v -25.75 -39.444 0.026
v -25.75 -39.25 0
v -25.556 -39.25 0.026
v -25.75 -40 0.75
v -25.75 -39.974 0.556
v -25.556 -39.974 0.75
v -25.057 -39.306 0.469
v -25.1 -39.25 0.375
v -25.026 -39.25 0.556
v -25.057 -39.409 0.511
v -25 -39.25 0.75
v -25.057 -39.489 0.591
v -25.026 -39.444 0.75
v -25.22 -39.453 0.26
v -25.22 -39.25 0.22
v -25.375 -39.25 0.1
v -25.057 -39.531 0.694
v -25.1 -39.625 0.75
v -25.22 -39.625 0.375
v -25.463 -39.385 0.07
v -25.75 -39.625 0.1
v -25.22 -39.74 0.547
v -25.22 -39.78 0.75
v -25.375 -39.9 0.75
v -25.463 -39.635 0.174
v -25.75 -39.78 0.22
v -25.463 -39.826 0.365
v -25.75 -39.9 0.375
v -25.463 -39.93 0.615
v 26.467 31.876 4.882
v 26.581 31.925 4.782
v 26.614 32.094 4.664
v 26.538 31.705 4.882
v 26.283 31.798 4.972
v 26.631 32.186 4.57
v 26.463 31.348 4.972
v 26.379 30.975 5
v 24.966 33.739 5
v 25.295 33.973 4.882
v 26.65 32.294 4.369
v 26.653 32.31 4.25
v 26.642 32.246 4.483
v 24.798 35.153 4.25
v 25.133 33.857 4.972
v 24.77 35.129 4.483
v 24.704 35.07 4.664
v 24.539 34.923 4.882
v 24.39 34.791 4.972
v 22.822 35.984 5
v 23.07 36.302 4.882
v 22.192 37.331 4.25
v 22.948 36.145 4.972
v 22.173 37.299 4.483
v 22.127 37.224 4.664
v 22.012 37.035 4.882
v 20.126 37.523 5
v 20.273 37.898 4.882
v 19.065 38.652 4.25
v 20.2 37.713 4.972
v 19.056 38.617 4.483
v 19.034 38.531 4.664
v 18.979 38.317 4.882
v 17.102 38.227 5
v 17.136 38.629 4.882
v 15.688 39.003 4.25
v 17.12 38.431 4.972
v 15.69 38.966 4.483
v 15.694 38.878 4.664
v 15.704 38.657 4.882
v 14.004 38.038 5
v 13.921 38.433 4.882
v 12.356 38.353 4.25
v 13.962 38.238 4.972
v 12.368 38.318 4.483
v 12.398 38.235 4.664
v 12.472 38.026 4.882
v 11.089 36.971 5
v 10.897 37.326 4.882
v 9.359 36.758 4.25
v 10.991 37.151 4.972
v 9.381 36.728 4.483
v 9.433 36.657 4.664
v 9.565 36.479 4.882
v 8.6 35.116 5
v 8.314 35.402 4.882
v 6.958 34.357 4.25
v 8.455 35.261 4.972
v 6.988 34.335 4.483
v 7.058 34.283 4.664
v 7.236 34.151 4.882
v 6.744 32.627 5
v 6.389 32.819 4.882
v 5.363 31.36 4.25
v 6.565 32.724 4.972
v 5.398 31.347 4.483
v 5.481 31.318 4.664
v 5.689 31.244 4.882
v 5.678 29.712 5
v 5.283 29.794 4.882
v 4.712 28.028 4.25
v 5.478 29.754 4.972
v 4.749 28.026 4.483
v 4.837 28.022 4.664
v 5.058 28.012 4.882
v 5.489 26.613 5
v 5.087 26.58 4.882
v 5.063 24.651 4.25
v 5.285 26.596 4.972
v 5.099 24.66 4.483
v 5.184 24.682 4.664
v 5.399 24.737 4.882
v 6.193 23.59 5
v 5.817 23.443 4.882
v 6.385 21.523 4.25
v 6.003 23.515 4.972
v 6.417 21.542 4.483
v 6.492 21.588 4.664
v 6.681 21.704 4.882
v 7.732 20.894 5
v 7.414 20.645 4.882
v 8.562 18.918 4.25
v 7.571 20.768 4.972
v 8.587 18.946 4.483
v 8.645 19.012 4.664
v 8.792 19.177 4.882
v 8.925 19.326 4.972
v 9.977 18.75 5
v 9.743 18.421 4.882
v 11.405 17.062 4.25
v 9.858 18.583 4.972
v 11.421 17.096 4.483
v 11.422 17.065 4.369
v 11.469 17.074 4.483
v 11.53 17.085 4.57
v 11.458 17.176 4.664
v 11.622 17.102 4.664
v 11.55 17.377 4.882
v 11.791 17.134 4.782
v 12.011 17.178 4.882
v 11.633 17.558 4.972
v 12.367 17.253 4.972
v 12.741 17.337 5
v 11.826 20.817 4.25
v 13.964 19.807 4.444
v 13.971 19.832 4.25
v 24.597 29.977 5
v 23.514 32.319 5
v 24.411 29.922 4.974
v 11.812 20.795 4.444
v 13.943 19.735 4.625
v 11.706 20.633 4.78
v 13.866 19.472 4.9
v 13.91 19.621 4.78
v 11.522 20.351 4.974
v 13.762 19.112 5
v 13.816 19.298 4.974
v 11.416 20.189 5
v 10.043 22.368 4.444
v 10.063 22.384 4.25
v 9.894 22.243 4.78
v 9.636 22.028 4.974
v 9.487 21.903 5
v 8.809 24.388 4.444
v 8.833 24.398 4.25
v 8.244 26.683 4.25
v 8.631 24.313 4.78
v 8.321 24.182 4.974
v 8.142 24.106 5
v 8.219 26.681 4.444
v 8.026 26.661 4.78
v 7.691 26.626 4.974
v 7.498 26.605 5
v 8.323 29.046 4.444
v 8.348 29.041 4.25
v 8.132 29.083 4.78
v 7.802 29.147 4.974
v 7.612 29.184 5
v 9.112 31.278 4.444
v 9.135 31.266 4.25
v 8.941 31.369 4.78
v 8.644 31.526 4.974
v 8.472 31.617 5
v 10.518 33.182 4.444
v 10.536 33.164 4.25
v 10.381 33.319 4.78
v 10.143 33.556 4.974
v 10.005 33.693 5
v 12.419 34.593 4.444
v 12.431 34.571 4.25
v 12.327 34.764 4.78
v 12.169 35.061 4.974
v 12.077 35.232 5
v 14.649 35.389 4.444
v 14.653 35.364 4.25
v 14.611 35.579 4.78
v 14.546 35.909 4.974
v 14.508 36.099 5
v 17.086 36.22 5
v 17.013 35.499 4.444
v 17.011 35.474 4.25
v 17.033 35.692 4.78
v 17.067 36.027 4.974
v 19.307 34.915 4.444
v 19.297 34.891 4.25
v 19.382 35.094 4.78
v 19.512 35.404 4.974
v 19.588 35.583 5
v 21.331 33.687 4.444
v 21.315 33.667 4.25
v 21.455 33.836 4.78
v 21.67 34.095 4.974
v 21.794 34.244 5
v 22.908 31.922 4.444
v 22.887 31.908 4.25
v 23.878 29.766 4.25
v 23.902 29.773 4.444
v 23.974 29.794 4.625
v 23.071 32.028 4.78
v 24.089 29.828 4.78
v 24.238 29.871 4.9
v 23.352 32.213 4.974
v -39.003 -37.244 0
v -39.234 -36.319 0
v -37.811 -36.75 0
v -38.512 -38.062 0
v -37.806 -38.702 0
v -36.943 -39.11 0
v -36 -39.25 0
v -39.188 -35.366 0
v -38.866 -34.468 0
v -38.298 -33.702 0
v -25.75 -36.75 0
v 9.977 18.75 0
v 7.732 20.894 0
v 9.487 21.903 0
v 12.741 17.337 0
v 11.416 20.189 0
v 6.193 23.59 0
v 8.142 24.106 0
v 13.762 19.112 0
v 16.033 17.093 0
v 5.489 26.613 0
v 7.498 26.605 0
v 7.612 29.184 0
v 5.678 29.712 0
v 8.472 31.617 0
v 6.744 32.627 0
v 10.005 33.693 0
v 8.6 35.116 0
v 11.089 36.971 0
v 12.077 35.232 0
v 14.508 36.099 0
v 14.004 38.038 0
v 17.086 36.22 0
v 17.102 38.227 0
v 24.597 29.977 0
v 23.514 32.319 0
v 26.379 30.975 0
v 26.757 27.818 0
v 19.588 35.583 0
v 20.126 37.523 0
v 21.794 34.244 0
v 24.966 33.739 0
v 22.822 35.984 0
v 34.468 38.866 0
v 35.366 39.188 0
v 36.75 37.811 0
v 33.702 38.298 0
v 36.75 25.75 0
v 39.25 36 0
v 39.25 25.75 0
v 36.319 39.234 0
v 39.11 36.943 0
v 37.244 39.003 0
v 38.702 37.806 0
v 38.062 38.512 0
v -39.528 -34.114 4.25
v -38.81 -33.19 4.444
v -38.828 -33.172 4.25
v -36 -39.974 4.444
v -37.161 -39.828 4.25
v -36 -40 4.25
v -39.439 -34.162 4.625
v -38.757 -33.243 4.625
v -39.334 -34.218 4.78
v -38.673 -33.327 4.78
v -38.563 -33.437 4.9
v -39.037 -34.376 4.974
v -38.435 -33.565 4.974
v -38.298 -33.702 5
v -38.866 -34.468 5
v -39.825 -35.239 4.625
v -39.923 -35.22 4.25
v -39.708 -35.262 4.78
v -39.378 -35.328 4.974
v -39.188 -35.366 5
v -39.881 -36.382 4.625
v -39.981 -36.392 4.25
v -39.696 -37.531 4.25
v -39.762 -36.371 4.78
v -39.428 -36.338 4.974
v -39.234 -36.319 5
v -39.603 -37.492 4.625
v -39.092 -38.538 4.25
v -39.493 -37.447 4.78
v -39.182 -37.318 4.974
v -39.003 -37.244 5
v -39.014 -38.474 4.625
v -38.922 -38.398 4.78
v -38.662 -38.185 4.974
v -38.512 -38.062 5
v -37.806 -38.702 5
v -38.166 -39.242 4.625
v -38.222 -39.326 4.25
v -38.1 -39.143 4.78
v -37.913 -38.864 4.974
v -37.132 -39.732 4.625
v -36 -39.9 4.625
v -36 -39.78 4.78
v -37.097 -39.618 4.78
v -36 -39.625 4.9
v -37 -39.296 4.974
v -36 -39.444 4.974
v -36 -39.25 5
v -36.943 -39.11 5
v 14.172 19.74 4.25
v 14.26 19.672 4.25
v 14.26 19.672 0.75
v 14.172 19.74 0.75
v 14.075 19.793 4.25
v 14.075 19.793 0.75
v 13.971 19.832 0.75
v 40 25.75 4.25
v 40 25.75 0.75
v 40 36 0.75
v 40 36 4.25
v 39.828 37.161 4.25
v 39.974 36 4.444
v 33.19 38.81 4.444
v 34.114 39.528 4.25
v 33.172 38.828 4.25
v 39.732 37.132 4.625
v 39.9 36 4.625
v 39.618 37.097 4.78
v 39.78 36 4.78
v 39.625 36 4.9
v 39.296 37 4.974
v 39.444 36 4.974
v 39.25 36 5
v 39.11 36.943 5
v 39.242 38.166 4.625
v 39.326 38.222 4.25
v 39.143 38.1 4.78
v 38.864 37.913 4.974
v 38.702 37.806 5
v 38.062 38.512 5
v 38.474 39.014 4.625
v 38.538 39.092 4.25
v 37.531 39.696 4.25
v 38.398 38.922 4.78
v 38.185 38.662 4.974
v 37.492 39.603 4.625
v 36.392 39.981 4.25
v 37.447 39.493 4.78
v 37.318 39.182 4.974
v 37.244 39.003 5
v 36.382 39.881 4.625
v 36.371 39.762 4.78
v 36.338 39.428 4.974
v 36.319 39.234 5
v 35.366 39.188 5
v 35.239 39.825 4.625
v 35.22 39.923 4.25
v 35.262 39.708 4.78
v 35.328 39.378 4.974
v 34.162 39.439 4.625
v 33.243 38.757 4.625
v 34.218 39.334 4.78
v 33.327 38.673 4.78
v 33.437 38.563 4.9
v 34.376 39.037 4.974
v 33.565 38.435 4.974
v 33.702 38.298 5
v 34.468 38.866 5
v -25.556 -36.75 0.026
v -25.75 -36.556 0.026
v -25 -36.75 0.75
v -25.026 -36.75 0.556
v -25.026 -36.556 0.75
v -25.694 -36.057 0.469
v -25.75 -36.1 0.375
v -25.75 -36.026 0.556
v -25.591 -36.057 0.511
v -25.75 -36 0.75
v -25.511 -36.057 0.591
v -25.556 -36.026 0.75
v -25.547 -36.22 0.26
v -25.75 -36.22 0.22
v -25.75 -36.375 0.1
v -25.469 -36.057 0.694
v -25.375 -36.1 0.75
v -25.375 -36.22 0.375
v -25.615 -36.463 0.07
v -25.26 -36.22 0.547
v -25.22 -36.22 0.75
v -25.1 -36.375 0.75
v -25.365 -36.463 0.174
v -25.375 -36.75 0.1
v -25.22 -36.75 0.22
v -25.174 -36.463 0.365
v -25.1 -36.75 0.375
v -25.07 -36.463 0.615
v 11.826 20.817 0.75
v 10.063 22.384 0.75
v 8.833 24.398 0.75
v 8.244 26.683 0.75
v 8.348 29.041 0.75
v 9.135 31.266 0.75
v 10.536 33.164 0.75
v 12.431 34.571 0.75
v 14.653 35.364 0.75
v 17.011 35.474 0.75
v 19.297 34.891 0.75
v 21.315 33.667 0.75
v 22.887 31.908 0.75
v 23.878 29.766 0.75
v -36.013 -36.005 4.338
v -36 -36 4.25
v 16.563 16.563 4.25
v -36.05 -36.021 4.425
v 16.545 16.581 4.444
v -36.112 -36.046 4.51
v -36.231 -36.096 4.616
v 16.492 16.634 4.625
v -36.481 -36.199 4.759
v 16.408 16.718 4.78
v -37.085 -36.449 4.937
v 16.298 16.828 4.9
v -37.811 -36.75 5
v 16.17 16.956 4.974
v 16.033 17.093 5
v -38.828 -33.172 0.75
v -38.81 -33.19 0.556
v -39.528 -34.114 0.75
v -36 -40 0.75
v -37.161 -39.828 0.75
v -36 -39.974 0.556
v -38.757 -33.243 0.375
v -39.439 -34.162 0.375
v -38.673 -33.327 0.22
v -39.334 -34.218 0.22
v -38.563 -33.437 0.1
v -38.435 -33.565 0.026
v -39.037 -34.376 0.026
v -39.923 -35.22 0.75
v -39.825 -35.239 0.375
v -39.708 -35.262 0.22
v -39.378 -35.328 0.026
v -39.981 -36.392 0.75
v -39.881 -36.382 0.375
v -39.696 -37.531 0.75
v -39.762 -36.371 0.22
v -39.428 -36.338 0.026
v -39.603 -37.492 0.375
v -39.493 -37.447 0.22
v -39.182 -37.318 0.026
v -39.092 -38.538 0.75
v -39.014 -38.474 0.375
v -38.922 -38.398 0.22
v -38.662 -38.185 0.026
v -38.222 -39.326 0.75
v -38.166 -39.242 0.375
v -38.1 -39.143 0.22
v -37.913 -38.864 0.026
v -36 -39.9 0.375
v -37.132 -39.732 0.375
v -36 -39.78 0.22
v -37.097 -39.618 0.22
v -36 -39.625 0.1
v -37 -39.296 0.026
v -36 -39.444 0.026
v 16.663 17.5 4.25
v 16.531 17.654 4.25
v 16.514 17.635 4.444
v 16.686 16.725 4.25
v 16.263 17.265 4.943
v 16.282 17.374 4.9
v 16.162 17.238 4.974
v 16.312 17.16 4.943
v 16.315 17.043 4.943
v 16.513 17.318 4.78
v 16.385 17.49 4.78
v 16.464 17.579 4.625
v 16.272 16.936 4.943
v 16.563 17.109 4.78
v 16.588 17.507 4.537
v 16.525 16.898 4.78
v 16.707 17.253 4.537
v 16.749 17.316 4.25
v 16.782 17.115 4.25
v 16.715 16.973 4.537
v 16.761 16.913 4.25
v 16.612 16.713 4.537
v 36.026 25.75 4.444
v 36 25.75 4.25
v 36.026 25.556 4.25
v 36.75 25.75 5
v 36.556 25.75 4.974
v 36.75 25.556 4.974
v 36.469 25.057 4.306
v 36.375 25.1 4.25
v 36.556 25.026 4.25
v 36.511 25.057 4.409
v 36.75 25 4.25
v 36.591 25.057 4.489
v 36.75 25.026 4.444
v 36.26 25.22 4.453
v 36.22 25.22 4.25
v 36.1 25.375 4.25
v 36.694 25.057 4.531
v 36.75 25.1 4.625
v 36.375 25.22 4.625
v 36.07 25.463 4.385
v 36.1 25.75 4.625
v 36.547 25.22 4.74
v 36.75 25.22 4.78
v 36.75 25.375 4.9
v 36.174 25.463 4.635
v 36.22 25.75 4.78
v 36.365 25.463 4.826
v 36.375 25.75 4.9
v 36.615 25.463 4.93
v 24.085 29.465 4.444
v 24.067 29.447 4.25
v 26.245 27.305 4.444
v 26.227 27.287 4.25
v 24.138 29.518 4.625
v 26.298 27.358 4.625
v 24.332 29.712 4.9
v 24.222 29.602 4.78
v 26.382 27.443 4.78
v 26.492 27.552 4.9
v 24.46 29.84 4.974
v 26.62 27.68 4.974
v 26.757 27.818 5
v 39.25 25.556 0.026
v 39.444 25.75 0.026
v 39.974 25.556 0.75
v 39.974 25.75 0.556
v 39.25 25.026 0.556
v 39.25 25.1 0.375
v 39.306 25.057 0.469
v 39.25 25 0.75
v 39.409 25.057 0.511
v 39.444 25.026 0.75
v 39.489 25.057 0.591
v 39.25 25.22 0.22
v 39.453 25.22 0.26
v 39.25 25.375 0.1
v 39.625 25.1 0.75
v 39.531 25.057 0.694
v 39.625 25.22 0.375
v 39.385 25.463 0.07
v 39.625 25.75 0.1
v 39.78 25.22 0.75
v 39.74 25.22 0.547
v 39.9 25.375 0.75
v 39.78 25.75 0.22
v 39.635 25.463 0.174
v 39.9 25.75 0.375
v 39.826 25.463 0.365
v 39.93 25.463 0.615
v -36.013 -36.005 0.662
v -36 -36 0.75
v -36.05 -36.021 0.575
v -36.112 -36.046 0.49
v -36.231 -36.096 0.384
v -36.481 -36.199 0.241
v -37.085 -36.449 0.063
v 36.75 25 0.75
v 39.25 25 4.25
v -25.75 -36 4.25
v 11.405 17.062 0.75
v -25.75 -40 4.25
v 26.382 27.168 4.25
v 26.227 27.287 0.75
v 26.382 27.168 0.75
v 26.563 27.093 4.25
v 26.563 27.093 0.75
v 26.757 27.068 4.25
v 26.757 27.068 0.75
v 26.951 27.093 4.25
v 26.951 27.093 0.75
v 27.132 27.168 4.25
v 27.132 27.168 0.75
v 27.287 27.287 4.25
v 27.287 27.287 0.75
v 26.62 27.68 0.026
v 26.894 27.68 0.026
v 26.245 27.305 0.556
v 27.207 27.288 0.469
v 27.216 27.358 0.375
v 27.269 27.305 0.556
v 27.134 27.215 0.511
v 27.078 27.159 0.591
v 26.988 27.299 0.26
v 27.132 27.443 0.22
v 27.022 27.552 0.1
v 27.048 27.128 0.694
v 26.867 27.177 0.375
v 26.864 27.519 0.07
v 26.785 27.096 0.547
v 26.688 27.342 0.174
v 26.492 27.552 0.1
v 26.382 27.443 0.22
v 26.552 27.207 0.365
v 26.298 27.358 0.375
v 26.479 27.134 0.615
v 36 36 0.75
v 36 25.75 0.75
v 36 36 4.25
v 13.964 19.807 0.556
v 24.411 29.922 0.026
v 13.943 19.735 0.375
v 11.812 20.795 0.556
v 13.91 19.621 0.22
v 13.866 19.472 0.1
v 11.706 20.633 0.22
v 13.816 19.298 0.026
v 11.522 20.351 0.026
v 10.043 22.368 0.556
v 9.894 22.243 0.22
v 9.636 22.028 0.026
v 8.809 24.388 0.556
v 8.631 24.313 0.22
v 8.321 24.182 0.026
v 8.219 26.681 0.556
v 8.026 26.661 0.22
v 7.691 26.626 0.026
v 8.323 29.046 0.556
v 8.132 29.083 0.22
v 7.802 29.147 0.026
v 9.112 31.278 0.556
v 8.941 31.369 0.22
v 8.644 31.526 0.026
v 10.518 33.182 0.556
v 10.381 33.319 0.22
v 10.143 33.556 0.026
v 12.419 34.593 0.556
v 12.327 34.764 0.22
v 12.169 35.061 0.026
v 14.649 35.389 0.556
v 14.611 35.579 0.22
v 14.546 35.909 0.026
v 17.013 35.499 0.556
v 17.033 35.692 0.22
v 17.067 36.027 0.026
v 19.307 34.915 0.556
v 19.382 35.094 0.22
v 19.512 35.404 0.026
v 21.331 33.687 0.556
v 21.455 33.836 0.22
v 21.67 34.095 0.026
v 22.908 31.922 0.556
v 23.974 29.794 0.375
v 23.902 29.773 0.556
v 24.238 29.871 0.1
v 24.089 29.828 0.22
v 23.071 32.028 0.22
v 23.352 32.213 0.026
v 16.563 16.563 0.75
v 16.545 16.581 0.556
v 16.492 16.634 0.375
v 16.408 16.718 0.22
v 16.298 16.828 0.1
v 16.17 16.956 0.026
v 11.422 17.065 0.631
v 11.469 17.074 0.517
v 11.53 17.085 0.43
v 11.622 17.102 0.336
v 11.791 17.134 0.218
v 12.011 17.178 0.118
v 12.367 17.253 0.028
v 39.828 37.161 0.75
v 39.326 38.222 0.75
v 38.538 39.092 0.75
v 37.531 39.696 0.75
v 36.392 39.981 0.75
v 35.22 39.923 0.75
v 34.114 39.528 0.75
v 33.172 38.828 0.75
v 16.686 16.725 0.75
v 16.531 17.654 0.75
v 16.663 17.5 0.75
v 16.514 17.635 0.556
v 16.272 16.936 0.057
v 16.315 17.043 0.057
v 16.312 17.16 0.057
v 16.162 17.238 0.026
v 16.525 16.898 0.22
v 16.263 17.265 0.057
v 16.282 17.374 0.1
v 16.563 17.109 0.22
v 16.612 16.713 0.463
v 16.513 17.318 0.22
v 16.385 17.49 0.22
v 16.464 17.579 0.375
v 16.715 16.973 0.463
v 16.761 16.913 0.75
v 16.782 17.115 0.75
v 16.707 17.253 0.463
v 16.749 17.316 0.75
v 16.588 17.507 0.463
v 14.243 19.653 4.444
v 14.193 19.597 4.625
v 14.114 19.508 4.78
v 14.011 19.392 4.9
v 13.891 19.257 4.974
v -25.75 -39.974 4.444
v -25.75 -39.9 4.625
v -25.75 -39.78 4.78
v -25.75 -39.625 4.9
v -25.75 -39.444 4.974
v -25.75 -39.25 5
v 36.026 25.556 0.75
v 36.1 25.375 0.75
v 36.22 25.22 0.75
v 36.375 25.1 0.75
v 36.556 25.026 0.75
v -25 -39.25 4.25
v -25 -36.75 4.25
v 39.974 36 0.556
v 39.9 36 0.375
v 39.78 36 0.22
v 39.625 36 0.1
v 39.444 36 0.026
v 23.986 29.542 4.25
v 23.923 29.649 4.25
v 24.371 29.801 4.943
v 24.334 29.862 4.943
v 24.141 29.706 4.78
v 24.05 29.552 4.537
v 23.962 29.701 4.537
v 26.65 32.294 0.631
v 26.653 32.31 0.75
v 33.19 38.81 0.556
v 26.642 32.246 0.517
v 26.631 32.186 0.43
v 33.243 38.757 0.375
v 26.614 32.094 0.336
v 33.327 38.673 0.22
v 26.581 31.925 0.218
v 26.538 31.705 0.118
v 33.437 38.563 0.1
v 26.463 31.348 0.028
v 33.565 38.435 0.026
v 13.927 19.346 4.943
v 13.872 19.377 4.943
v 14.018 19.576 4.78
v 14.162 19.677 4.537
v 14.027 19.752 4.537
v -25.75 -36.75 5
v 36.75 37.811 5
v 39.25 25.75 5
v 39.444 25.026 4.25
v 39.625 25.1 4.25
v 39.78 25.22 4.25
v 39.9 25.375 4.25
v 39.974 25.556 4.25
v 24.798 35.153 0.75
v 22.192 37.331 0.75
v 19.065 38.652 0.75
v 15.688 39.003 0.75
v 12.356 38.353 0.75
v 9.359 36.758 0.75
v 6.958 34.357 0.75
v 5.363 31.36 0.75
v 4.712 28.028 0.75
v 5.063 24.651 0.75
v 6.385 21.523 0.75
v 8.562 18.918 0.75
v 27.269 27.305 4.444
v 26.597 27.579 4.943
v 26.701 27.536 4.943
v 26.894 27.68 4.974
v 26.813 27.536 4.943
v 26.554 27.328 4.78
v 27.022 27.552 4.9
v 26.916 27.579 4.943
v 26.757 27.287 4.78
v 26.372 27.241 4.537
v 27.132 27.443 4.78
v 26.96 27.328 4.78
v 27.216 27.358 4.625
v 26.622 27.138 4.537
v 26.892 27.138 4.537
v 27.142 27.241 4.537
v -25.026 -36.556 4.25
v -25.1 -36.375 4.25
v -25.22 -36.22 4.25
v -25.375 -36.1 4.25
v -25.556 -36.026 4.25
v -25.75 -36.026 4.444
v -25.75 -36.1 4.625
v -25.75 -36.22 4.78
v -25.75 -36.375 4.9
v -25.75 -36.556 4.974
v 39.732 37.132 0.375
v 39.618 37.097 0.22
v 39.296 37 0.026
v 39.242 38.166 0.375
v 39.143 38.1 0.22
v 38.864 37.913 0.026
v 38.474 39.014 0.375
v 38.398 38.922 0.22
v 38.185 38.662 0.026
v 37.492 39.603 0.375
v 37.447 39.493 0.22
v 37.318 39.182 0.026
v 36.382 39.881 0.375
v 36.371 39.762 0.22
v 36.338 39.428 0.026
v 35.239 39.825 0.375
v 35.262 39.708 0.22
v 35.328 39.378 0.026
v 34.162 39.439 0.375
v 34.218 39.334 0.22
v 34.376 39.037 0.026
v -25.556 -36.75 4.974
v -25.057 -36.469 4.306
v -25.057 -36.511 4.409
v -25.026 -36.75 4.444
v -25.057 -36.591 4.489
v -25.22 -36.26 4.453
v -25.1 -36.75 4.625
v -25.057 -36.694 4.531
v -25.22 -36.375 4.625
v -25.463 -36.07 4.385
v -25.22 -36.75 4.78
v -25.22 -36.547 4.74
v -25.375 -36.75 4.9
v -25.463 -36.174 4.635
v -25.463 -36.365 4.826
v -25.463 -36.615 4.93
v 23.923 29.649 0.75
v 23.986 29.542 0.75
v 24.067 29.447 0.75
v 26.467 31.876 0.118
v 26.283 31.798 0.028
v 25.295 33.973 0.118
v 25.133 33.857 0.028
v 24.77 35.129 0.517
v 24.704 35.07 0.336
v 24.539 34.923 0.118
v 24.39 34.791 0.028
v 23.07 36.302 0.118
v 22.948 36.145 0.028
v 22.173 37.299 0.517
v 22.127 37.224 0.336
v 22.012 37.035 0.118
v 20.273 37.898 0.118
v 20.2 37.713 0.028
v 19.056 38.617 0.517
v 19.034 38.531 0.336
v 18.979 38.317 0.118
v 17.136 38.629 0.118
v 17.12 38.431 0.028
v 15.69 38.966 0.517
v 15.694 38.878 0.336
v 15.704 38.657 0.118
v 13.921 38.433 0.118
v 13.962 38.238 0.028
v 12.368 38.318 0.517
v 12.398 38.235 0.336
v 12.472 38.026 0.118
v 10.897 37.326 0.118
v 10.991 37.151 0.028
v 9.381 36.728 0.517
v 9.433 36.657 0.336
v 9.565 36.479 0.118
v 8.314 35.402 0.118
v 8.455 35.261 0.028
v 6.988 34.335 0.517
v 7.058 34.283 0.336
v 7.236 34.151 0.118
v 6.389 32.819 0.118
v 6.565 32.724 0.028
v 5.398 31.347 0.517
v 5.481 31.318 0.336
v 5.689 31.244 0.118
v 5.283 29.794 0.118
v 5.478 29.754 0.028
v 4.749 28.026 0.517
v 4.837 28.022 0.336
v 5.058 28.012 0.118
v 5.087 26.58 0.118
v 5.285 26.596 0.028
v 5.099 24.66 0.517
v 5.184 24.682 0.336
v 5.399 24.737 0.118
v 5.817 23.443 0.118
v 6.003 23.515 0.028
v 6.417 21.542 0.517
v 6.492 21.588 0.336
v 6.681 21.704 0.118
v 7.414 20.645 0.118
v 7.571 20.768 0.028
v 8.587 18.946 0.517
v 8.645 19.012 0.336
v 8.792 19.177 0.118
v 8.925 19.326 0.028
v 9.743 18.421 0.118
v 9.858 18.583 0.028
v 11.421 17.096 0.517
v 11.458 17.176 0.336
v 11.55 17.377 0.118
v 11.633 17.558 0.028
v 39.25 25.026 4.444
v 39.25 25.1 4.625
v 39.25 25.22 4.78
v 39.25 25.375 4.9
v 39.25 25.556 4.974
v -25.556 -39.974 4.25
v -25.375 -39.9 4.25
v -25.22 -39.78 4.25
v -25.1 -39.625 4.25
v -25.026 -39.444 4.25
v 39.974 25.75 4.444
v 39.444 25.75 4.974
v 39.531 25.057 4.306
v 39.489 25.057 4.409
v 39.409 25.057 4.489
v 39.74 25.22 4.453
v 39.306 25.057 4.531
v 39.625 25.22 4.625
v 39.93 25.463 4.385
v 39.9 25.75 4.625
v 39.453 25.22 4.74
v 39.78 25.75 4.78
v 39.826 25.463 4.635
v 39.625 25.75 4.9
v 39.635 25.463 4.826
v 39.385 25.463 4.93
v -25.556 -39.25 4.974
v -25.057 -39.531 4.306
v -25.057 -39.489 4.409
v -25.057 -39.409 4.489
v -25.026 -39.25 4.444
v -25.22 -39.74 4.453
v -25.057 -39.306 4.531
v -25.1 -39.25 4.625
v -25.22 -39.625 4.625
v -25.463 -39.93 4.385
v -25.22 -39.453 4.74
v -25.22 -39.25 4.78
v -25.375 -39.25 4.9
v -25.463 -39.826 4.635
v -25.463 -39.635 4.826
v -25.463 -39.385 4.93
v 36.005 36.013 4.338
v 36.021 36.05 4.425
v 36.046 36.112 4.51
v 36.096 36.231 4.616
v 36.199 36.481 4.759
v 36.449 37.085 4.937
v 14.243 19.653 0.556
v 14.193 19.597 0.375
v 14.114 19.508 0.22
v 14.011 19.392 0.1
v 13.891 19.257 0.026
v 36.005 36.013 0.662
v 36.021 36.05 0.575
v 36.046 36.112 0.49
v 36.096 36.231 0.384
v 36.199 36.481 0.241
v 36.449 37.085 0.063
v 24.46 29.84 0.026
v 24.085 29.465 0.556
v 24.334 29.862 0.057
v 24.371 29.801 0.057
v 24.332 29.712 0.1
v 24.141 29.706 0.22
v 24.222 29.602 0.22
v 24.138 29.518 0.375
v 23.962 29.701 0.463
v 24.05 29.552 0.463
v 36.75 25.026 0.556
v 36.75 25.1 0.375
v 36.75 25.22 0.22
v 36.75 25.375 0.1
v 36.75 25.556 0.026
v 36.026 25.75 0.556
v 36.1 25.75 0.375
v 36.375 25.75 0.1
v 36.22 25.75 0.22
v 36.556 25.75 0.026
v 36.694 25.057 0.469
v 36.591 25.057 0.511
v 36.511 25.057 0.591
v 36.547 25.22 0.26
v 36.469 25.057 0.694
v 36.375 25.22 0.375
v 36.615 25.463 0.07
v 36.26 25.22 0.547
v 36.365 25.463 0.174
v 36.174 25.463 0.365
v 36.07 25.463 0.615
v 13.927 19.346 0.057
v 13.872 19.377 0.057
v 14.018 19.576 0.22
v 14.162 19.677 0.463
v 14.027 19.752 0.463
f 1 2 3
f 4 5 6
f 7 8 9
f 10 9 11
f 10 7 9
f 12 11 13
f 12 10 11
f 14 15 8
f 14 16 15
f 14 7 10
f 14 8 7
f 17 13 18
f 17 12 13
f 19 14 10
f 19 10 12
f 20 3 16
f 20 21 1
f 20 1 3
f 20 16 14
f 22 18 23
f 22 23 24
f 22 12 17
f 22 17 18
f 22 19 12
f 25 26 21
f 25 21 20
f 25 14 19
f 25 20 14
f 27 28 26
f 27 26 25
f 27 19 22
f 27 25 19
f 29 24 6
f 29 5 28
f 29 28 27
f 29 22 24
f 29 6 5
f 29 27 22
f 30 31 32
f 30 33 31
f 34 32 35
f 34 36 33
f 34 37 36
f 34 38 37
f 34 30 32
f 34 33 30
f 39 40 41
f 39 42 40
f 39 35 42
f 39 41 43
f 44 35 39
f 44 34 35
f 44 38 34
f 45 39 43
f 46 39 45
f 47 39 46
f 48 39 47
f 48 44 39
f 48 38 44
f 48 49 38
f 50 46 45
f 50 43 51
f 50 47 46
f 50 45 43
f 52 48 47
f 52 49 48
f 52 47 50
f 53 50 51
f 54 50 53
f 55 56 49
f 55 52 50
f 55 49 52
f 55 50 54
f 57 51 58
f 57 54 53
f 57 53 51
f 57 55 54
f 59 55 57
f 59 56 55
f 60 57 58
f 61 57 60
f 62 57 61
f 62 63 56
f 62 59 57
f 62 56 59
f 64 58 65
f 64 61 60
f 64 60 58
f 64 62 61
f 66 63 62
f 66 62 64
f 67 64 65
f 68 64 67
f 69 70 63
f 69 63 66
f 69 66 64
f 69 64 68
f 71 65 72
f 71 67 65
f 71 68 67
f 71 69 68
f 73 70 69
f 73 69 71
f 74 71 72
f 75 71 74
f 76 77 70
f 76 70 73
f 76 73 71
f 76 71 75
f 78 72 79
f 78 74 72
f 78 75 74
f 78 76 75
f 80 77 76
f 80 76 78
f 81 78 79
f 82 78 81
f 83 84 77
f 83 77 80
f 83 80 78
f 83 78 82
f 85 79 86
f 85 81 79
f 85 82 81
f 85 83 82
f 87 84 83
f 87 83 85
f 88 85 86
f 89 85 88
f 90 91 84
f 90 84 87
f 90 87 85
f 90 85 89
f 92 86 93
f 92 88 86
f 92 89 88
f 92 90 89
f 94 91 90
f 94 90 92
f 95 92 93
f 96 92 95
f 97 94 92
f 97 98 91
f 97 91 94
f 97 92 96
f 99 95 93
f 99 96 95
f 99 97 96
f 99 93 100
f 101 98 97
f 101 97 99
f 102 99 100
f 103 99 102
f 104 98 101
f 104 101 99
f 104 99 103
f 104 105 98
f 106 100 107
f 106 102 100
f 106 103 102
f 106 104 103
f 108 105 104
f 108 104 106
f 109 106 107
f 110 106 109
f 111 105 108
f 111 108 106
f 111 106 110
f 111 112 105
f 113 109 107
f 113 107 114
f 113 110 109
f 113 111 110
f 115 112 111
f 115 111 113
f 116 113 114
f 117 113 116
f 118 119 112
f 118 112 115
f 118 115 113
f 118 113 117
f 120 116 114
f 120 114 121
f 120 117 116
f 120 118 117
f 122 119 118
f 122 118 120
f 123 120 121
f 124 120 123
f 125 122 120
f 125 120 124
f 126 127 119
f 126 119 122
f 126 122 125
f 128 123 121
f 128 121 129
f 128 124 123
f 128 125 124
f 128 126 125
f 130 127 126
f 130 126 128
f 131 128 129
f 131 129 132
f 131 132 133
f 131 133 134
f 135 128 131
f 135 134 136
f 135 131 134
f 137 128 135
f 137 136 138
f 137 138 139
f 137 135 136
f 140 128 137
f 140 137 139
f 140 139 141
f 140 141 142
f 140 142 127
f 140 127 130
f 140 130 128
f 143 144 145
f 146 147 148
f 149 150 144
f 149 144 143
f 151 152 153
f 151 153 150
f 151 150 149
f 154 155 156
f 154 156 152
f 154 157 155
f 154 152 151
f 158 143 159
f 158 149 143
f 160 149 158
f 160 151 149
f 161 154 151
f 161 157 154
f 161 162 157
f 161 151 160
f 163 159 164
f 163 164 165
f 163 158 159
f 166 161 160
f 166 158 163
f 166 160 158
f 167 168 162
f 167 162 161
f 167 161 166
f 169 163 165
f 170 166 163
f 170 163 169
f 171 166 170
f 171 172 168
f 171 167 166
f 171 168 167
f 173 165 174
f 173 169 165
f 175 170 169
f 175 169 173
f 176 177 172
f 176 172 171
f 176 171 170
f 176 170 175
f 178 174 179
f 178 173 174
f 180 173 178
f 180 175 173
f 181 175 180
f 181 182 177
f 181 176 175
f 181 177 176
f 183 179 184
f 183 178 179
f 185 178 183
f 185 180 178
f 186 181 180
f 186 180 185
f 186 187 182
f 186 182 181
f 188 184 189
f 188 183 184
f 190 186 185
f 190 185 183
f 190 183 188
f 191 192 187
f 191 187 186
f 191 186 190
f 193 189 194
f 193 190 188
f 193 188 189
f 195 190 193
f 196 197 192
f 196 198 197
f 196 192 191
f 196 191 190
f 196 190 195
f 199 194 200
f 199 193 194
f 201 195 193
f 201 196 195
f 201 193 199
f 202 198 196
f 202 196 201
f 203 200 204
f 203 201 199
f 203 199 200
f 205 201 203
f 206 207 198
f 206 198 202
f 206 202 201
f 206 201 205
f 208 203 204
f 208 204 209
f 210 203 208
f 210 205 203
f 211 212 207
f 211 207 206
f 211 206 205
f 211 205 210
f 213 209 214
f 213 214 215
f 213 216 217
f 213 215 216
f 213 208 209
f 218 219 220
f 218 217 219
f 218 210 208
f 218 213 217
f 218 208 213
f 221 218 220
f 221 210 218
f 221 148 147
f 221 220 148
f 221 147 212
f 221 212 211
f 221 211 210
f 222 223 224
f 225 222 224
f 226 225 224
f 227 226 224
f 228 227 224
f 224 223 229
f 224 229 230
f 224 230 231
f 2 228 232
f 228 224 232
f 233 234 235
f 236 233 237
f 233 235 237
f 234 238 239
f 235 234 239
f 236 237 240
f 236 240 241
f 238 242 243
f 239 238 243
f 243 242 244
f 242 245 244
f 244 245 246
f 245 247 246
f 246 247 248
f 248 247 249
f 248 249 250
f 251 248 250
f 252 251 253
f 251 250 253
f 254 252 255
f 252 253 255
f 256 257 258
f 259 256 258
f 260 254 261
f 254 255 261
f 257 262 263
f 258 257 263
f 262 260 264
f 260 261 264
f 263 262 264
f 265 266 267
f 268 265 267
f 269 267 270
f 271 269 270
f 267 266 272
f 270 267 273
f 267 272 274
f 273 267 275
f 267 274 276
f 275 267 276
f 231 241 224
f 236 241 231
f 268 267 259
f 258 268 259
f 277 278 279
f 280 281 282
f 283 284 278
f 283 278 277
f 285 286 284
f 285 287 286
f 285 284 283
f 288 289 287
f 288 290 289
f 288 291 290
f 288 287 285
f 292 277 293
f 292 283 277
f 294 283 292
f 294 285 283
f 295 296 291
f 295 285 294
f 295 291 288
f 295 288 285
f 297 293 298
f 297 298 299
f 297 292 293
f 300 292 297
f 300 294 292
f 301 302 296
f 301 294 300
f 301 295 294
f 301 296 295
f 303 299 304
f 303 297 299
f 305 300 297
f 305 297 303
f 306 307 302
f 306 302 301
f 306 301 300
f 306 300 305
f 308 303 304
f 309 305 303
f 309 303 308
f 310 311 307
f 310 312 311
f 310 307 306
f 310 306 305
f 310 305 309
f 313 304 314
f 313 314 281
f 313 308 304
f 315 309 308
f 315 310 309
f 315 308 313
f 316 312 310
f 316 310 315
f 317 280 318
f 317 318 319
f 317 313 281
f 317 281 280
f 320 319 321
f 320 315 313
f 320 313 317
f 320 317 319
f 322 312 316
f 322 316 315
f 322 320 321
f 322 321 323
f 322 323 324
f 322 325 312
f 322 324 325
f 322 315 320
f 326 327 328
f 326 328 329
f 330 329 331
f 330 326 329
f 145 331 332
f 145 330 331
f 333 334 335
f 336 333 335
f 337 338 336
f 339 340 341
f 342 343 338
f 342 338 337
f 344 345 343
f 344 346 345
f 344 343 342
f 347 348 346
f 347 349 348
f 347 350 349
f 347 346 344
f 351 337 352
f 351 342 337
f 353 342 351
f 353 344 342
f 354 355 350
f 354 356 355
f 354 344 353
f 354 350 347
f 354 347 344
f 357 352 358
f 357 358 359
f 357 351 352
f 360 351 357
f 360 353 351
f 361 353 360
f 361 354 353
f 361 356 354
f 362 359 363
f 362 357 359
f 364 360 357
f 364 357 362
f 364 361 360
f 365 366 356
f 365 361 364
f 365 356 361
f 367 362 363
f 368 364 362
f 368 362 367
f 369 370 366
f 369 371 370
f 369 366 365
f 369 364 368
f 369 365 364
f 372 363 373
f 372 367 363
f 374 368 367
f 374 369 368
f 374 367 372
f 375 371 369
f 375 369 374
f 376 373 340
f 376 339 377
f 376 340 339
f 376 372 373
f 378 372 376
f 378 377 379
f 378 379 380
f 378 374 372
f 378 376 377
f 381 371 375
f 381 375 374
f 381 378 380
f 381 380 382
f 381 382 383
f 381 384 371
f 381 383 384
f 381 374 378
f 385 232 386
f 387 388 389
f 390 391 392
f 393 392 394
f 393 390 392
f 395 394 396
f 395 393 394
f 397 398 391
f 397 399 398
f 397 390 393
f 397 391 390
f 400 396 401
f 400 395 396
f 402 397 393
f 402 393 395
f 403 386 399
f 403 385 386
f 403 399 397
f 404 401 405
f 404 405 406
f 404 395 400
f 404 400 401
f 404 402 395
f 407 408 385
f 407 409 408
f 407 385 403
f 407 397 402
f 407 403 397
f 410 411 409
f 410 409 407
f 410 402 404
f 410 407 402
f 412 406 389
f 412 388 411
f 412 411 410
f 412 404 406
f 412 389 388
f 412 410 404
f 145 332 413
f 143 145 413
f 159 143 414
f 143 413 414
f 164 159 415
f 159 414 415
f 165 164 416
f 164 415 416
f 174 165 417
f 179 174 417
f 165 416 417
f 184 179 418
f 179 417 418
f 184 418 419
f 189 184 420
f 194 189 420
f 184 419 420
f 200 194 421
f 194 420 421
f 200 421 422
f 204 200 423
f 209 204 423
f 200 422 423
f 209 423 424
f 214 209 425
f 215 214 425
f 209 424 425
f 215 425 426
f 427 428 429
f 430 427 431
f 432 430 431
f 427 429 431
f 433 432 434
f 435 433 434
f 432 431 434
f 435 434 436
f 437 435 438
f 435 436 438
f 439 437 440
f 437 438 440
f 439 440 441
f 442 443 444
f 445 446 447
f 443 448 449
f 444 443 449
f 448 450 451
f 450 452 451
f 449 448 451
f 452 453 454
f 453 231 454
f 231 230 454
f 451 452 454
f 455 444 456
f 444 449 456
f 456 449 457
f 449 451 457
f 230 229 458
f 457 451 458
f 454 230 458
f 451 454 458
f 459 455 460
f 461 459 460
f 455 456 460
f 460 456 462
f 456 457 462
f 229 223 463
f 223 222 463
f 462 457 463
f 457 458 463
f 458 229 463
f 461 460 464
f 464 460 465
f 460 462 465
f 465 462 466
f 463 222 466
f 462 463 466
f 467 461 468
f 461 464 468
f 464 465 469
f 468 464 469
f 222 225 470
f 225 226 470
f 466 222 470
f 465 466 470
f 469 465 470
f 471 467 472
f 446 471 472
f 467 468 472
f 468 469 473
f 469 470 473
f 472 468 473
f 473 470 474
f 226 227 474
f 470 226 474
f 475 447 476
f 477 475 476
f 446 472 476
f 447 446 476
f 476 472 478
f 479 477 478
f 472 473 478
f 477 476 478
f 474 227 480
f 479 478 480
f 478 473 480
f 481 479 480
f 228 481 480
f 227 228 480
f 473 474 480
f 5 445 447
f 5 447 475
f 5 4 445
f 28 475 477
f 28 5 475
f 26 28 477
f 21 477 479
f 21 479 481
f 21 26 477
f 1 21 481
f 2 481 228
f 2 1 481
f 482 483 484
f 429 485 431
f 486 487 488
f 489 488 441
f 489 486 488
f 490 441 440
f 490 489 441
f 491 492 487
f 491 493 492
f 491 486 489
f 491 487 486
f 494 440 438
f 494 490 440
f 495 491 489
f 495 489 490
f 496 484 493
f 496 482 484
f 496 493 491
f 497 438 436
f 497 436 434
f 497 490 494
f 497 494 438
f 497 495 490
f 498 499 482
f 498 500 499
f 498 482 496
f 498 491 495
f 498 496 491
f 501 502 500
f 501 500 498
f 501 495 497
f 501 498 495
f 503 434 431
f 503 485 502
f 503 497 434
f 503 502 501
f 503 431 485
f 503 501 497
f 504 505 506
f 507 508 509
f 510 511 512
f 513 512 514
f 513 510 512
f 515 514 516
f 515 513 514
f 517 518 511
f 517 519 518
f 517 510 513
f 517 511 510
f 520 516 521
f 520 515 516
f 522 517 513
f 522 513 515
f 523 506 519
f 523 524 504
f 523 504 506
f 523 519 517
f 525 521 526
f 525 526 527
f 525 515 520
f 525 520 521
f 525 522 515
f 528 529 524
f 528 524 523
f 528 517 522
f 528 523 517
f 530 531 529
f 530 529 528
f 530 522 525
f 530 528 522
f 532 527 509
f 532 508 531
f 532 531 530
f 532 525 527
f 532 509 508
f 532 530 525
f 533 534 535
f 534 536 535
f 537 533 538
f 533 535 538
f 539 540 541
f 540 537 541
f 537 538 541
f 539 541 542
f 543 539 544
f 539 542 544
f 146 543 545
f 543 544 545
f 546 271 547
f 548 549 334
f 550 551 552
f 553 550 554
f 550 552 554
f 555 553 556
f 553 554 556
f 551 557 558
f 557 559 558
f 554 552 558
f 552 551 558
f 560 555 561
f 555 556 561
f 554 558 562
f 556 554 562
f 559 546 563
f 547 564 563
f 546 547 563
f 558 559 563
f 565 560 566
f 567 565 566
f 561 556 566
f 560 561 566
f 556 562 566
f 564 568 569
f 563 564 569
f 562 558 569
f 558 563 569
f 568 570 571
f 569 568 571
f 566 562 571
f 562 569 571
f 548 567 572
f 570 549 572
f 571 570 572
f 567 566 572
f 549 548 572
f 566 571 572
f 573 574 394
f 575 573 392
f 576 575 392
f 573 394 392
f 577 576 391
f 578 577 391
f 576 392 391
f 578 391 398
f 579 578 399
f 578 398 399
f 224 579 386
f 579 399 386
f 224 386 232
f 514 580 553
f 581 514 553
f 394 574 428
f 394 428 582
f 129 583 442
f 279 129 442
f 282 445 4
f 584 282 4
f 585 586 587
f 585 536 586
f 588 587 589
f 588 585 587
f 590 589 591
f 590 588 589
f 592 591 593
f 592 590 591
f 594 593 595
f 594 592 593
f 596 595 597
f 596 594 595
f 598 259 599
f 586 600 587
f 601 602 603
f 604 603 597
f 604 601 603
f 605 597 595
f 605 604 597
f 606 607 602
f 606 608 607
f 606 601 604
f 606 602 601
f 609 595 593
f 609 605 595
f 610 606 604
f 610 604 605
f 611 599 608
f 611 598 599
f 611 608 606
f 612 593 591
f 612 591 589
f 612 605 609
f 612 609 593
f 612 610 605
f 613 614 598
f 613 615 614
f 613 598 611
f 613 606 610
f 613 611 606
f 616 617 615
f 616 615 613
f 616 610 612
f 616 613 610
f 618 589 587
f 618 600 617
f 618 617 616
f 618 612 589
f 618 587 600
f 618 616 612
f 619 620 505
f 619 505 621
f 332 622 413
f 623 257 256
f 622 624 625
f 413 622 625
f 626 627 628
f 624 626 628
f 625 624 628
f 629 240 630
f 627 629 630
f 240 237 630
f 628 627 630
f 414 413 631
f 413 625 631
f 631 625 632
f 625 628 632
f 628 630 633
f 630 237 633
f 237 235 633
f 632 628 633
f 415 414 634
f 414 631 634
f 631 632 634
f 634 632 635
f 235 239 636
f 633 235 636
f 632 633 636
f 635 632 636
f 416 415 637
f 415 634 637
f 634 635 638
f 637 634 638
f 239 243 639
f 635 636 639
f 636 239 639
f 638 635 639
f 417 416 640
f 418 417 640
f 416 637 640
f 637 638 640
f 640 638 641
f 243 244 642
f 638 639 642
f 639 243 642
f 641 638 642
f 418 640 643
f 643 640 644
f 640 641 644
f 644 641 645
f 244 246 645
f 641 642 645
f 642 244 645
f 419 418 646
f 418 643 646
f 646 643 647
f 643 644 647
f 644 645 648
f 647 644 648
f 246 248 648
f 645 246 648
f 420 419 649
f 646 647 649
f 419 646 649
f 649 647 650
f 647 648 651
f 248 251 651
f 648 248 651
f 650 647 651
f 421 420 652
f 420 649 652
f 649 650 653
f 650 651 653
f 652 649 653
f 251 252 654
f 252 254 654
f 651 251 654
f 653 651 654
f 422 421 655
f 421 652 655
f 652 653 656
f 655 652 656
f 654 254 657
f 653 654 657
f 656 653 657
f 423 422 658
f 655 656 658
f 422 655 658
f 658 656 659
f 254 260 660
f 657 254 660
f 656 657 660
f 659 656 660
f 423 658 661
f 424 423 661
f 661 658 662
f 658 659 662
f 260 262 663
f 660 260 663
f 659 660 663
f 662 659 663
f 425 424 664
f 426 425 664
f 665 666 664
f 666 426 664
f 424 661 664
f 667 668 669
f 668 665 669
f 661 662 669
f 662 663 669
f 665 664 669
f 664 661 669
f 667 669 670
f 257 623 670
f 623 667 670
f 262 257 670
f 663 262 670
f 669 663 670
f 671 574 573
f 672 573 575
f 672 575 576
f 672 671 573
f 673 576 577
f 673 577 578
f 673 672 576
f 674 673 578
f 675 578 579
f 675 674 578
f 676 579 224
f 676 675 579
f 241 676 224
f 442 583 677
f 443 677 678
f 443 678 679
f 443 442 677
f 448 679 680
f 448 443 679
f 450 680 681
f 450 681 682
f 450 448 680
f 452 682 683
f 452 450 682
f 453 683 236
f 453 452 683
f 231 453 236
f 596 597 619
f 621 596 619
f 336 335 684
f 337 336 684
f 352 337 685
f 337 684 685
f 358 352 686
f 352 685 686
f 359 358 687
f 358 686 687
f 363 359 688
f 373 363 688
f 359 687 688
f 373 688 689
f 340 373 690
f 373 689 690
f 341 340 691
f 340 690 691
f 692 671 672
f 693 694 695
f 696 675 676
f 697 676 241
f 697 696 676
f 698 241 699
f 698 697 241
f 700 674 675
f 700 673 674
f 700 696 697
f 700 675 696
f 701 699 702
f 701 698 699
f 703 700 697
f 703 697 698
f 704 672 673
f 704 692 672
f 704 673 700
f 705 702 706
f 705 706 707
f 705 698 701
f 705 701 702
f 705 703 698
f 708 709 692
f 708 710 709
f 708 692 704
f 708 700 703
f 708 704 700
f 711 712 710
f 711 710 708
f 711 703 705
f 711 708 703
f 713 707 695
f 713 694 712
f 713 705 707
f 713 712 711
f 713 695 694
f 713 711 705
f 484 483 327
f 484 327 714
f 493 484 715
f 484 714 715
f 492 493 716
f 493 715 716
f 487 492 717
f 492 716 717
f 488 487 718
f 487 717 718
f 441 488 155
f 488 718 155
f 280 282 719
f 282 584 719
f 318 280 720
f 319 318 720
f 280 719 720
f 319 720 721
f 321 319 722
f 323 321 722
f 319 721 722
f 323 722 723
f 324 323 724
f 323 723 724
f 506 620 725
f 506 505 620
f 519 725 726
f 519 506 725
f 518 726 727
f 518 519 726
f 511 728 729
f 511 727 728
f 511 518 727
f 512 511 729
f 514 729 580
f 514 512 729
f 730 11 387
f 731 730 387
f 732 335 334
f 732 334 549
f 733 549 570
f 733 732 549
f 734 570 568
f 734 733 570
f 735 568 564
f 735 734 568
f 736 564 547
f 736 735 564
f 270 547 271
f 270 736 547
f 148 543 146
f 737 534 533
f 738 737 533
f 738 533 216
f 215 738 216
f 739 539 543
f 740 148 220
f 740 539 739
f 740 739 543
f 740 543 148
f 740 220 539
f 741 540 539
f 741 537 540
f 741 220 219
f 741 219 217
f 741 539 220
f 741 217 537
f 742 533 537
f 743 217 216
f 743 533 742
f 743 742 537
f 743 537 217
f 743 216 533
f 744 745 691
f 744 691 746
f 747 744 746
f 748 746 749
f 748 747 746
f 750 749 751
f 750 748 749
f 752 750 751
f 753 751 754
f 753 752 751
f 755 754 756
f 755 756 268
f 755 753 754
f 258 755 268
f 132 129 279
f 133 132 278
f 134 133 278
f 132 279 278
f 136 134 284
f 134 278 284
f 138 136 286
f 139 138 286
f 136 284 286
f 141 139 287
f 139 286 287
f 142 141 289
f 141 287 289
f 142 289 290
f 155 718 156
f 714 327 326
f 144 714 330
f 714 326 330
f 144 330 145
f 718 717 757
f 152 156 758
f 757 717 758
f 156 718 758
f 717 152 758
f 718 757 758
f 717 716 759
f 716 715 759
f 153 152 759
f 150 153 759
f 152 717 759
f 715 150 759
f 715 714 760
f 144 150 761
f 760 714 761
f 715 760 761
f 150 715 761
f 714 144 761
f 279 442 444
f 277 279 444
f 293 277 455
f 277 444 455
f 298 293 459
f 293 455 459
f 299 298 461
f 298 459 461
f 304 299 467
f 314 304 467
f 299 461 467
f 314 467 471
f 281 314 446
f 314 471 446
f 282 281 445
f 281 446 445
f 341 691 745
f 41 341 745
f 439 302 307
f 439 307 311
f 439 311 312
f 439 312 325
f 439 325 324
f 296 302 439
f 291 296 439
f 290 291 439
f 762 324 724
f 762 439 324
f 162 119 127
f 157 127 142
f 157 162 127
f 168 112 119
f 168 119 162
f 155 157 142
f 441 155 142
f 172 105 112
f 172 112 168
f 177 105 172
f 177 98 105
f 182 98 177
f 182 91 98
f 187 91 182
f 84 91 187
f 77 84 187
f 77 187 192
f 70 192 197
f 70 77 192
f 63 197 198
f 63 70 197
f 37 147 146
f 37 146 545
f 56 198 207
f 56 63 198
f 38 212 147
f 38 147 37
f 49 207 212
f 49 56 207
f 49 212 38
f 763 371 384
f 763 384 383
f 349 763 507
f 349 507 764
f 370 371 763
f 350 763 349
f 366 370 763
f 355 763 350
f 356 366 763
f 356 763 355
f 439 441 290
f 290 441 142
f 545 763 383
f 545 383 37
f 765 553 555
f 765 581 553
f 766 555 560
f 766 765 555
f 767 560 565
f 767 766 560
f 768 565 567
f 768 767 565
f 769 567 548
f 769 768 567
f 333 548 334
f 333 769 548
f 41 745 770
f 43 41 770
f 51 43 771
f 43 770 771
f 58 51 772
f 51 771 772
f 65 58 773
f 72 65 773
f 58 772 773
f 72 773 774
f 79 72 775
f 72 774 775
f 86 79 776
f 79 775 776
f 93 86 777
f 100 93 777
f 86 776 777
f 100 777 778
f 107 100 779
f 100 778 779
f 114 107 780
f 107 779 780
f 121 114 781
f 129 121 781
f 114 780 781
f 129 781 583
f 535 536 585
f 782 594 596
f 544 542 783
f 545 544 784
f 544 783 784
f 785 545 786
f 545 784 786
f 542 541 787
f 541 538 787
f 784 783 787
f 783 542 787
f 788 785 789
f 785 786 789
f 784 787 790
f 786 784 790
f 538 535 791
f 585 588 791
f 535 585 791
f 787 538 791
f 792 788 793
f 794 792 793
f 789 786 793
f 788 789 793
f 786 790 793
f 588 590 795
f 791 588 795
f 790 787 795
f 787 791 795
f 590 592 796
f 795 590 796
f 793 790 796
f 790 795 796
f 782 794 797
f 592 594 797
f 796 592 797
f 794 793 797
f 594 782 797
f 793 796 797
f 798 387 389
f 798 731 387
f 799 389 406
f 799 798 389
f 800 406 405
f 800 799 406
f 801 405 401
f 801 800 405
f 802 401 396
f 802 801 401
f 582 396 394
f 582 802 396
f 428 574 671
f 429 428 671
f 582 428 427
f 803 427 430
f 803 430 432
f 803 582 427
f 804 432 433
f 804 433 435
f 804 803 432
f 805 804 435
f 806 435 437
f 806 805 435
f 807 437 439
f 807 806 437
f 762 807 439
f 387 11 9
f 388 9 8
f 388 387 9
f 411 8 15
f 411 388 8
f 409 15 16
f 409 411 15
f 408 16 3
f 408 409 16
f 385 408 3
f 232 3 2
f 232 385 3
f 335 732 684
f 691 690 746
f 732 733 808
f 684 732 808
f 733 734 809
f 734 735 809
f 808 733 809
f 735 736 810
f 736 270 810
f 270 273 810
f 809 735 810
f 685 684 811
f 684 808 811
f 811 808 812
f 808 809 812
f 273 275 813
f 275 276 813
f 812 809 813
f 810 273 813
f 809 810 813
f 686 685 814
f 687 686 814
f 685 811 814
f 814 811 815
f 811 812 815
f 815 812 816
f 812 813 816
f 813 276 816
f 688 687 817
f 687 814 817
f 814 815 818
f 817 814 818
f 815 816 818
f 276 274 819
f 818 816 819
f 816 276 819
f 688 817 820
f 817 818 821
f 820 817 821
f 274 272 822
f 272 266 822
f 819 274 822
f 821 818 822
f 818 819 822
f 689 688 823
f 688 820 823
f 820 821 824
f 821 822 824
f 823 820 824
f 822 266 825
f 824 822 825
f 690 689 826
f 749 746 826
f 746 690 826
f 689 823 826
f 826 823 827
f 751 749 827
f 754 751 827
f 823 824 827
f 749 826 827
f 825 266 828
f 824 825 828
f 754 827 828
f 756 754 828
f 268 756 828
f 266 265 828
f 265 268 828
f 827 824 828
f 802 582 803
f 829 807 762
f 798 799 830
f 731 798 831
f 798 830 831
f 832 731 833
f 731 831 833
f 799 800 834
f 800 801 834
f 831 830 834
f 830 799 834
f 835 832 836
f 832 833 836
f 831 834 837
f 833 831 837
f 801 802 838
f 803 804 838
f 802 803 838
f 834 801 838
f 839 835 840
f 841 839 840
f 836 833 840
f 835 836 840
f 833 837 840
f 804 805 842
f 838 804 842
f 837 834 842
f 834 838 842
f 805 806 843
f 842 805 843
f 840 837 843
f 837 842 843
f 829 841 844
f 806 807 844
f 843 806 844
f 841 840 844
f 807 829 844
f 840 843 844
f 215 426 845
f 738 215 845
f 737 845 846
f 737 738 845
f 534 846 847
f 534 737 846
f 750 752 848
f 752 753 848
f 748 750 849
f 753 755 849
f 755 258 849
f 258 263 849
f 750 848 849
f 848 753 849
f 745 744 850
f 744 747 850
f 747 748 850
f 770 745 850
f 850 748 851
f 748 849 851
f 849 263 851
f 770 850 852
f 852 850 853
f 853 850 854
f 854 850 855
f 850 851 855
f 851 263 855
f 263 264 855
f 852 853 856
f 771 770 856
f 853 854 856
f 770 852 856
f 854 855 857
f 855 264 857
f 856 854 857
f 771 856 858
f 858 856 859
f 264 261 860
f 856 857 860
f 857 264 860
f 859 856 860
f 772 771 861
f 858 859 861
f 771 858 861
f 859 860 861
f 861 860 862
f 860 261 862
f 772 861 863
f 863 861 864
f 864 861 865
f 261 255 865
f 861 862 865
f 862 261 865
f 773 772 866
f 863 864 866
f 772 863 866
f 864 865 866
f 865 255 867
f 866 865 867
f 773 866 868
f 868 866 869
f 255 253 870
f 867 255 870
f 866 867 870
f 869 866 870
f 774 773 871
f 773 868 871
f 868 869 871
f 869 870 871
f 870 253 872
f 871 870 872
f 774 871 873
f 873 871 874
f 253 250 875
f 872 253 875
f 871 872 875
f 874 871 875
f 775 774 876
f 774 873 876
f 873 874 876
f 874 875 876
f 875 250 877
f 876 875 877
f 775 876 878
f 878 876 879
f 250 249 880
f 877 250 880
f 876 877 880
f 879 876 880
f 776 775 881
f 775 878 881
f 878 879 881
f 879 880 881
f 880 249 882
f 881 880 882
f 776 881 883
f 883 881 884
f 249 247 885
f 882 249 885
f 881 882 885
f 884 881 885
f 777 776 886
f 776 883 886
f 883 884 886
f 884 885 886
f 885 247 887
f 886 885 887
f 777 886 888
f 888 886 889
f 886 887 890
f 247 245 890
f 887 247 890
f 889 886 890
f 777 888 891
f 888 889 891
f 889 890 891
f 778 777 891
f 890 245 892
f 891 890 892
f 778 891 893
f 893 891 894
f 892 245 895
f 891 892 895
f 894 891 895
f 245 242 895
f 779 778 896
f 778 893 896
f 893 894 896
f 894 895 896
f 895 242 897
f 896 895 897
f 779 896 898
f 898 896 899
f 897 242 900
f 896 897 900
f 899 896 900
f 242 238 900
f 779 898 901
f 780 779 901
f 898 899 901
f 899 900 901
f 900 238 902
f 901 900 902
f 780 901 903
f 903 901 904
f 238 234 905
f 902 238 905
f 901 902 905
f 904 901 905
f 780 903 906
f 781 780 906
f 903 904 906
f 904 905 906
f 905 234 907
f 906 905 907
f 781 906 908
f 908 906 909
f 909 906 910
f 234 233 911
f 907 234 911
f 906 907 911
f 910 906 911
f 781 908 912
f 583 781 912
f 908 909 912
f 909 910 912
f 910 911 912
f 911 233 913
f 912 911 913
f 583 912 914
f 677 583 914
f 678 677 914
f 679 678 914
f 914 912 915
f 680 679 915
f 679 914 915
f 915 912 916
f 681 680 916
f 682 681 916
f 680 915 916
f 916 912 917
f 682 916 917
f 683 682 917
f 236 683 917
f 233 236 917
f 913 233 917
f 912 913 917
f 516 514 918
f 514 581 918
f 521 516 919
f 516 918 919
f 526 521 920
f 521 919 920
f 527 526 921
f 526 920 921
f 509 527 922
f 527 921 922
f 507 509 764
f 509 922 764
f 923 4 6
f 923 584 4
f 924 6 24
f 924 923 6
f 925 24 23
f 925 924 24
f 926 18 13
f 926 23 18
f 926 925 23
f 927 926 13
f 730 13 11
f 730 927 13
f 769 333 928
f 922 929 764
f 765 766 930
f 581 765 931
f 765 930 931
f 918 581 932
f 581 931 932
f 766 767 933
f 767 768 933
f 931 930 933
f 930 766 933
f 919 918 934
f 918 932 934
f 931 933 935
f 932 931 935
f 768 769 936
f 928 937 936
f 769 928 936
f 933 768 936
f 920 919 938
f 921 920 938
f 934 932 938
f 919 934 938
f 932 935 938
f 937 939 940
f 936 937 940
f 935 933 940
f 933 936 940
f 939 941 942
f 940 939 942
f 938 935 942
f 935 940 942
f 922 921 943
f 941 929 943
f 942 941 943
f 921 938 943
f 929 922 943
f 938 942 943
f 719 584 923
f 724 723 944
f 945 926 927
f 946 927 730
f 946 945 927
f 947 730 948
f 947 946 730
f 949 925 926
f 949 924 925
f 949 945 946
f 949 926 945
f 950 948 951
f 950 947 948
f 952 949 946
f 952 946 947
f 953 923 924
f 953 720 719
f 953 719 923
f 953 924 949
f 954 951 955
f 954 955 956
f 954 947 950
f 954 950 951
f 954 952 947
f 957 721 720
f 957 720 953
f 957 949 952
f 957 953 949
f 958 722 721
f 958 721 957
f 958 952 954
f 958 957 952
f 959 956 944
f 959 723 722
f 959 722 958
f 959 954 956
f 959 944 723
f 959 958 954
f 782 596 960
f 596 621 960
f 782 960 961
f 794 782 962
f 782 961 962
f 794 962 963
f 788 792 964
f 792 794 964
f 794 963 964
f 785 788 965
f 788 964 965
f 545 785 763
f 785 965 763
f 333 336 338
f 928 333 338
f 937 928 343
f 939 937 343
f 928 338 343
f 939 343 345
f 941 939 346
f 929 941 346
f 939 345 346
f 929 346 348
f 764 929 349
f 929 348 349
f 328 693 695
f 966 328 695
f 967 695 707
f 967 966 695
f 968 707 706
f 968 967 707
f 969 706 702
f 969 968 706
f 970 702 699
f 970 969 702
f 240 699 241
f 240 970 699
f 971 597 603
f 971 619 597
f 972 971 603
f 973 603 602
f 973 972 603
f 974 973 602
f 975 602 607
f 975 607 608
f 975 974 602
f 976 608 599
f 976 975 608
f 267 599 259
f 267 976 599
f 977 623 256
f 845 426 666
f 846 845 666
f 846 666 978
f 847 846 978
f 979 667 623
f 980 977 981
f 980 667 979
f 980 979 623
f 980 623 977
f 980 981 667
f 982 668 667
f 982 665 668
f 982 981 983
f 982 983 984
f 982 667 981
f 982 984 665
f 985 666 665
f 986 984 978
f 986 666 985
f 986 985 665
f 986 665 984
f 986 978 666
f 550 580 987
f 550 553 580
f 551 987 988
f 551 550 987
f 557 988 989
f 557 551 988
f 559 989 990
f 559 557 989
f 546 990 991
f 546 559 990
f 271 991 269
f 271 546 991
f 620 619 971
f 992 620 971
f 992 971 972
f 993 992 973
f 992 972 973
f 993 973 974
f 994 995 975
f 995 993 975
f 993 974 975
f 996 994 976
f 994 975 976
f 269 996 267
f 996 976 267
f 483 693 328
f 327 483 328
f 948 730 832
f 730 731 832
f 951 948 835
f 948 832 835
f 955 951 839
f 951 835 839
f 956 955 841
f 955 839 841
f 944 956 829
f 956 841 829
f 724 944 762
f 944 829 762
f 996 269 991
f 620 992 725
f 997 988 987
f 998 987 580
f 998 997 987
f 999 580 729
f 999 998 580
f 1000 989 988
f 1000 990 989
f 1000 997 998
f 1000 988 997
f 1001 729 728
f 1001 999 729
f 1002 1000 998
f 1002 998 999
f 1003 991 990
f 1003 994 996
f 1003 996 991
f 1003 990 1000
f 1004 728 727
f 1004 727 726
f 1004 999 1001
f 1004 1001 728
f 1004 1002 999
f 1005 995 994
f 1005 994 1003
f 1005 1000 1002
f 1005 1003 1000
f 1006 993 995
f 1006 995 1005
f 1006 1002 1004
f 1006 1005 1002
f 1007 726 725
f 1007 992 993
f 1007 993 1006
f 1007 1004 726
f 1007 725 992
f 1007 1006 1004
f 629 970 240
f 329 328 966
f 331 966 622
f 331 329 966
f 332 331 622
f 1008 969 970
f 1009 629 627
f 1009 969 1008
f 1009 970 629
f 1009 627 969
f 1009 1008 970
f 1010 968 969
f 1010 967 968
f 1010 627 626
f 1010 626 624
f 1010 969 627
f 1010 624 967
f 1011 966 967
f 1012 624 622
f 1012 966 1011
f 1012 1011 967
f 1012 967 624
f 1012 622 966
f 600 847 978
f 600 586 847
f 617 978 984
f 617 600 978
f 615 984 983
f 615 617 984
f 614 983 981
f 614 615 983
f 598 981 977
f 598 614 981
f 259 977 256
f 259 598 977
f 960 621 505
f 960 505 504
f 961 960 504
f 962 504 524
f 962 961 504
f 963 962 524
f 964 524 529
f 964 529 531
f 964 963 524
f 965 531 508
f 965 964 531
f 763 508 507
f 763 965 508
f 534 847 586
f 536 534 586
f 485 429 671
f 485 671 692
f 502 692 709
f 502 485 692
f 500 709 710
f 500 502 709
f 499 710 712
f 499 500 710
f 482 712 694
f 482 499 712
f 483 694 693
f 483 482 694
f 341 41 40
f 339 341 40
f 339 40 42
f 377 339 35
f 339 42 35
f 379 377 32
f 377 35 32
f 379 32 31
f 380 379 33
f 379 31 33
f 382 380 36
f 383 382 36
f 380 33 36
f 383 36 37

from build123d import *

# Parameters (mm, degrees)
F0_W     = 11
F0_H     = 4
F0_W_2   = 4
F0_H_2   = 11
F1_DEPTH = 5
F2_R     = 0.75


# Not quite as in the source:
# - a feature names something its author has since deleted; it is built from what else it names


with BuildPart() as f1:
    # F0 (on Top) → F1 (new body)
    with BuildSketch(Plane.XY):
        with Locations((-30.5, -38)):
            Rectangle(F0_W, F0_H)
        with Locations((38, 30.5)):
            Rectangle(F0_W_2, F0_H_2)
        with BuildLine():
            Line((-38.8284271247, -33.1715728753), (-36, -36))
            Line((-36, -36), (16.0162036535, 16.0162036535))
            ThreePointArc((16.0162036535, 16.0162036535), (13.656492284, 16.2997541163), (11.4054619105, 17.06231616))
            Line((11.4054619105, 17.06231616), (-38.8284271247, -33.1715728753))
        make_face()
        with BuildLine():
            Line((-36, -40), (-36, -36))
            Line((-36, -36), (-38.8284271247, -33.1715728753))
            ThreePointArc((-38.8284271247, -33.1715728753), (-39.69551813, -37.5307337295), (-36, -40))
        make_face()
        with BuildLine():
            Line((33.1715728753, 38.8284271247), (36, 36))
            Line((36, 36), (40, 36))
            ThreePointArc((40, 36), (37.5307337295, 39.69551813), (33.1715728753, 38.8284271247))
        make_face()
        with BuildLine():
            Line((27.699525099, 27.699525099), (36, 36))
            Line((36, 36), (33.1715728753, 38.8284271247))
            Line((33.1715728753, 38.8284271247), (26.6534125925, 32.310266842))
            ThreePointArc((26.6534125925, 32.310266842), (27.4159746362, 30.0592364686), (27.699525099, 27.699525099))
        make_face()
        with BuildLine():
            ThreePointArc((11.4054619105, 17.06231616), (13.656492284, 16.2997541163), (16.0162036535, 16.0162036535))
            Line((16.0162036535, 16.0162036535), (17.1253699809, 17.1253699809))
            Line((17.1253699809, 17.1253699809), (14.130457766, 19.7873120154))
            Line((14.130457766, 19.7873120154), (11.4054619105, 17.06231616))
        make_face()
        with BuildLine():
            Line((26.7568438618, 26.7568438618), (27.699525099, 27.699525099))
            ThreePointArc((27.699525099, 27.699525099), (27.4159746362, 30.0592364686), (26.6534125925, 32.310266842))
            Line((26.6534125925, 32.310266842), (23.9284167371, 29.5852709866))
            Line((23.9284167371, 29.5852709866), (26.7568438618, 26.7568438618))
        make_face()
        with BuildLine():
            ThreePointArc((26.6534125925, 32.310266842), (8.0692821431, 35.6464466094), (11.4054619105, 17.06231616))
            Line((11.4054619105, 17.06231616), (14.130457766, 19.7873120154))
            ThreePointArc((14.130457766, 19.7873120154), (10.5441558773, 33.1715728753), (23.9284167371, 29.5852709866))
            Line((23.9284167371, 29.5852709866), (26.6534125925, 32.310266842))
        make_face()
    extrude(amount=F1_DEPTH)

    # F2
    f2_edges = [f1.edges().sort_by_distance(p)[0] for p in [
        (-13.711483, -8.054628, 0),
        (29.912493, 35.569347, 0),
        (-13.711483, -8.054628, 5),
        (29.912493, 35.569347, 5),
        (-25, -38, 0),
        (-30.5, -36, 0),
        (-9.437315, -9.437315, 0),
        (15.627914, 18.456341, 0),
        (10.544156, 33.171573, 0),
        (25.34263, 28.171057, 0),
        (31.378422, 31.378422, 0),
        (36, 30.5, 0),
        (38, 25, 0),
        (40, 30.5, 0),
        (37.530734, 39.695518, 0),
        (8.069282, 35.646447, 0),
        (-39.695518, -37.530734, 0),
        (-30.5, -40, 0),
        (36, 30.5, 5),
        (36, 25, 2.5),
        (40, 25, 2.5),
        (38, 25, 5),
        (-9.437315, -9.437315, 5),
        (-30.5, -36, 5),
        (-25, -40, 2.5),
        (-25, -36, 2.5),
        (-25, -38, 5),
        (23.928417, 29.585271, 2.5),
        (26.756844, 26.756844, 2.5),
        (17.12537, 17.12537, 2.5),
        (14.130458, 19.787312, 2.5),
        (8.069282, 35.646447, 5),
        (15.627914, 18.456341, 5),
        (25.34263, 28.171057, 5),
        (10.544156, 33.171573, 5),
        (31.378422, 31.378422, 5),
        (40, 30.5, 5),
        (37.530734, 39.695518, 5),
        (-39.695518, -37.530734, 5),
        (-30.5, -40, 5),
    ]]
    fillet(f2_edges, radius=F2_R)


solid = f1.part
